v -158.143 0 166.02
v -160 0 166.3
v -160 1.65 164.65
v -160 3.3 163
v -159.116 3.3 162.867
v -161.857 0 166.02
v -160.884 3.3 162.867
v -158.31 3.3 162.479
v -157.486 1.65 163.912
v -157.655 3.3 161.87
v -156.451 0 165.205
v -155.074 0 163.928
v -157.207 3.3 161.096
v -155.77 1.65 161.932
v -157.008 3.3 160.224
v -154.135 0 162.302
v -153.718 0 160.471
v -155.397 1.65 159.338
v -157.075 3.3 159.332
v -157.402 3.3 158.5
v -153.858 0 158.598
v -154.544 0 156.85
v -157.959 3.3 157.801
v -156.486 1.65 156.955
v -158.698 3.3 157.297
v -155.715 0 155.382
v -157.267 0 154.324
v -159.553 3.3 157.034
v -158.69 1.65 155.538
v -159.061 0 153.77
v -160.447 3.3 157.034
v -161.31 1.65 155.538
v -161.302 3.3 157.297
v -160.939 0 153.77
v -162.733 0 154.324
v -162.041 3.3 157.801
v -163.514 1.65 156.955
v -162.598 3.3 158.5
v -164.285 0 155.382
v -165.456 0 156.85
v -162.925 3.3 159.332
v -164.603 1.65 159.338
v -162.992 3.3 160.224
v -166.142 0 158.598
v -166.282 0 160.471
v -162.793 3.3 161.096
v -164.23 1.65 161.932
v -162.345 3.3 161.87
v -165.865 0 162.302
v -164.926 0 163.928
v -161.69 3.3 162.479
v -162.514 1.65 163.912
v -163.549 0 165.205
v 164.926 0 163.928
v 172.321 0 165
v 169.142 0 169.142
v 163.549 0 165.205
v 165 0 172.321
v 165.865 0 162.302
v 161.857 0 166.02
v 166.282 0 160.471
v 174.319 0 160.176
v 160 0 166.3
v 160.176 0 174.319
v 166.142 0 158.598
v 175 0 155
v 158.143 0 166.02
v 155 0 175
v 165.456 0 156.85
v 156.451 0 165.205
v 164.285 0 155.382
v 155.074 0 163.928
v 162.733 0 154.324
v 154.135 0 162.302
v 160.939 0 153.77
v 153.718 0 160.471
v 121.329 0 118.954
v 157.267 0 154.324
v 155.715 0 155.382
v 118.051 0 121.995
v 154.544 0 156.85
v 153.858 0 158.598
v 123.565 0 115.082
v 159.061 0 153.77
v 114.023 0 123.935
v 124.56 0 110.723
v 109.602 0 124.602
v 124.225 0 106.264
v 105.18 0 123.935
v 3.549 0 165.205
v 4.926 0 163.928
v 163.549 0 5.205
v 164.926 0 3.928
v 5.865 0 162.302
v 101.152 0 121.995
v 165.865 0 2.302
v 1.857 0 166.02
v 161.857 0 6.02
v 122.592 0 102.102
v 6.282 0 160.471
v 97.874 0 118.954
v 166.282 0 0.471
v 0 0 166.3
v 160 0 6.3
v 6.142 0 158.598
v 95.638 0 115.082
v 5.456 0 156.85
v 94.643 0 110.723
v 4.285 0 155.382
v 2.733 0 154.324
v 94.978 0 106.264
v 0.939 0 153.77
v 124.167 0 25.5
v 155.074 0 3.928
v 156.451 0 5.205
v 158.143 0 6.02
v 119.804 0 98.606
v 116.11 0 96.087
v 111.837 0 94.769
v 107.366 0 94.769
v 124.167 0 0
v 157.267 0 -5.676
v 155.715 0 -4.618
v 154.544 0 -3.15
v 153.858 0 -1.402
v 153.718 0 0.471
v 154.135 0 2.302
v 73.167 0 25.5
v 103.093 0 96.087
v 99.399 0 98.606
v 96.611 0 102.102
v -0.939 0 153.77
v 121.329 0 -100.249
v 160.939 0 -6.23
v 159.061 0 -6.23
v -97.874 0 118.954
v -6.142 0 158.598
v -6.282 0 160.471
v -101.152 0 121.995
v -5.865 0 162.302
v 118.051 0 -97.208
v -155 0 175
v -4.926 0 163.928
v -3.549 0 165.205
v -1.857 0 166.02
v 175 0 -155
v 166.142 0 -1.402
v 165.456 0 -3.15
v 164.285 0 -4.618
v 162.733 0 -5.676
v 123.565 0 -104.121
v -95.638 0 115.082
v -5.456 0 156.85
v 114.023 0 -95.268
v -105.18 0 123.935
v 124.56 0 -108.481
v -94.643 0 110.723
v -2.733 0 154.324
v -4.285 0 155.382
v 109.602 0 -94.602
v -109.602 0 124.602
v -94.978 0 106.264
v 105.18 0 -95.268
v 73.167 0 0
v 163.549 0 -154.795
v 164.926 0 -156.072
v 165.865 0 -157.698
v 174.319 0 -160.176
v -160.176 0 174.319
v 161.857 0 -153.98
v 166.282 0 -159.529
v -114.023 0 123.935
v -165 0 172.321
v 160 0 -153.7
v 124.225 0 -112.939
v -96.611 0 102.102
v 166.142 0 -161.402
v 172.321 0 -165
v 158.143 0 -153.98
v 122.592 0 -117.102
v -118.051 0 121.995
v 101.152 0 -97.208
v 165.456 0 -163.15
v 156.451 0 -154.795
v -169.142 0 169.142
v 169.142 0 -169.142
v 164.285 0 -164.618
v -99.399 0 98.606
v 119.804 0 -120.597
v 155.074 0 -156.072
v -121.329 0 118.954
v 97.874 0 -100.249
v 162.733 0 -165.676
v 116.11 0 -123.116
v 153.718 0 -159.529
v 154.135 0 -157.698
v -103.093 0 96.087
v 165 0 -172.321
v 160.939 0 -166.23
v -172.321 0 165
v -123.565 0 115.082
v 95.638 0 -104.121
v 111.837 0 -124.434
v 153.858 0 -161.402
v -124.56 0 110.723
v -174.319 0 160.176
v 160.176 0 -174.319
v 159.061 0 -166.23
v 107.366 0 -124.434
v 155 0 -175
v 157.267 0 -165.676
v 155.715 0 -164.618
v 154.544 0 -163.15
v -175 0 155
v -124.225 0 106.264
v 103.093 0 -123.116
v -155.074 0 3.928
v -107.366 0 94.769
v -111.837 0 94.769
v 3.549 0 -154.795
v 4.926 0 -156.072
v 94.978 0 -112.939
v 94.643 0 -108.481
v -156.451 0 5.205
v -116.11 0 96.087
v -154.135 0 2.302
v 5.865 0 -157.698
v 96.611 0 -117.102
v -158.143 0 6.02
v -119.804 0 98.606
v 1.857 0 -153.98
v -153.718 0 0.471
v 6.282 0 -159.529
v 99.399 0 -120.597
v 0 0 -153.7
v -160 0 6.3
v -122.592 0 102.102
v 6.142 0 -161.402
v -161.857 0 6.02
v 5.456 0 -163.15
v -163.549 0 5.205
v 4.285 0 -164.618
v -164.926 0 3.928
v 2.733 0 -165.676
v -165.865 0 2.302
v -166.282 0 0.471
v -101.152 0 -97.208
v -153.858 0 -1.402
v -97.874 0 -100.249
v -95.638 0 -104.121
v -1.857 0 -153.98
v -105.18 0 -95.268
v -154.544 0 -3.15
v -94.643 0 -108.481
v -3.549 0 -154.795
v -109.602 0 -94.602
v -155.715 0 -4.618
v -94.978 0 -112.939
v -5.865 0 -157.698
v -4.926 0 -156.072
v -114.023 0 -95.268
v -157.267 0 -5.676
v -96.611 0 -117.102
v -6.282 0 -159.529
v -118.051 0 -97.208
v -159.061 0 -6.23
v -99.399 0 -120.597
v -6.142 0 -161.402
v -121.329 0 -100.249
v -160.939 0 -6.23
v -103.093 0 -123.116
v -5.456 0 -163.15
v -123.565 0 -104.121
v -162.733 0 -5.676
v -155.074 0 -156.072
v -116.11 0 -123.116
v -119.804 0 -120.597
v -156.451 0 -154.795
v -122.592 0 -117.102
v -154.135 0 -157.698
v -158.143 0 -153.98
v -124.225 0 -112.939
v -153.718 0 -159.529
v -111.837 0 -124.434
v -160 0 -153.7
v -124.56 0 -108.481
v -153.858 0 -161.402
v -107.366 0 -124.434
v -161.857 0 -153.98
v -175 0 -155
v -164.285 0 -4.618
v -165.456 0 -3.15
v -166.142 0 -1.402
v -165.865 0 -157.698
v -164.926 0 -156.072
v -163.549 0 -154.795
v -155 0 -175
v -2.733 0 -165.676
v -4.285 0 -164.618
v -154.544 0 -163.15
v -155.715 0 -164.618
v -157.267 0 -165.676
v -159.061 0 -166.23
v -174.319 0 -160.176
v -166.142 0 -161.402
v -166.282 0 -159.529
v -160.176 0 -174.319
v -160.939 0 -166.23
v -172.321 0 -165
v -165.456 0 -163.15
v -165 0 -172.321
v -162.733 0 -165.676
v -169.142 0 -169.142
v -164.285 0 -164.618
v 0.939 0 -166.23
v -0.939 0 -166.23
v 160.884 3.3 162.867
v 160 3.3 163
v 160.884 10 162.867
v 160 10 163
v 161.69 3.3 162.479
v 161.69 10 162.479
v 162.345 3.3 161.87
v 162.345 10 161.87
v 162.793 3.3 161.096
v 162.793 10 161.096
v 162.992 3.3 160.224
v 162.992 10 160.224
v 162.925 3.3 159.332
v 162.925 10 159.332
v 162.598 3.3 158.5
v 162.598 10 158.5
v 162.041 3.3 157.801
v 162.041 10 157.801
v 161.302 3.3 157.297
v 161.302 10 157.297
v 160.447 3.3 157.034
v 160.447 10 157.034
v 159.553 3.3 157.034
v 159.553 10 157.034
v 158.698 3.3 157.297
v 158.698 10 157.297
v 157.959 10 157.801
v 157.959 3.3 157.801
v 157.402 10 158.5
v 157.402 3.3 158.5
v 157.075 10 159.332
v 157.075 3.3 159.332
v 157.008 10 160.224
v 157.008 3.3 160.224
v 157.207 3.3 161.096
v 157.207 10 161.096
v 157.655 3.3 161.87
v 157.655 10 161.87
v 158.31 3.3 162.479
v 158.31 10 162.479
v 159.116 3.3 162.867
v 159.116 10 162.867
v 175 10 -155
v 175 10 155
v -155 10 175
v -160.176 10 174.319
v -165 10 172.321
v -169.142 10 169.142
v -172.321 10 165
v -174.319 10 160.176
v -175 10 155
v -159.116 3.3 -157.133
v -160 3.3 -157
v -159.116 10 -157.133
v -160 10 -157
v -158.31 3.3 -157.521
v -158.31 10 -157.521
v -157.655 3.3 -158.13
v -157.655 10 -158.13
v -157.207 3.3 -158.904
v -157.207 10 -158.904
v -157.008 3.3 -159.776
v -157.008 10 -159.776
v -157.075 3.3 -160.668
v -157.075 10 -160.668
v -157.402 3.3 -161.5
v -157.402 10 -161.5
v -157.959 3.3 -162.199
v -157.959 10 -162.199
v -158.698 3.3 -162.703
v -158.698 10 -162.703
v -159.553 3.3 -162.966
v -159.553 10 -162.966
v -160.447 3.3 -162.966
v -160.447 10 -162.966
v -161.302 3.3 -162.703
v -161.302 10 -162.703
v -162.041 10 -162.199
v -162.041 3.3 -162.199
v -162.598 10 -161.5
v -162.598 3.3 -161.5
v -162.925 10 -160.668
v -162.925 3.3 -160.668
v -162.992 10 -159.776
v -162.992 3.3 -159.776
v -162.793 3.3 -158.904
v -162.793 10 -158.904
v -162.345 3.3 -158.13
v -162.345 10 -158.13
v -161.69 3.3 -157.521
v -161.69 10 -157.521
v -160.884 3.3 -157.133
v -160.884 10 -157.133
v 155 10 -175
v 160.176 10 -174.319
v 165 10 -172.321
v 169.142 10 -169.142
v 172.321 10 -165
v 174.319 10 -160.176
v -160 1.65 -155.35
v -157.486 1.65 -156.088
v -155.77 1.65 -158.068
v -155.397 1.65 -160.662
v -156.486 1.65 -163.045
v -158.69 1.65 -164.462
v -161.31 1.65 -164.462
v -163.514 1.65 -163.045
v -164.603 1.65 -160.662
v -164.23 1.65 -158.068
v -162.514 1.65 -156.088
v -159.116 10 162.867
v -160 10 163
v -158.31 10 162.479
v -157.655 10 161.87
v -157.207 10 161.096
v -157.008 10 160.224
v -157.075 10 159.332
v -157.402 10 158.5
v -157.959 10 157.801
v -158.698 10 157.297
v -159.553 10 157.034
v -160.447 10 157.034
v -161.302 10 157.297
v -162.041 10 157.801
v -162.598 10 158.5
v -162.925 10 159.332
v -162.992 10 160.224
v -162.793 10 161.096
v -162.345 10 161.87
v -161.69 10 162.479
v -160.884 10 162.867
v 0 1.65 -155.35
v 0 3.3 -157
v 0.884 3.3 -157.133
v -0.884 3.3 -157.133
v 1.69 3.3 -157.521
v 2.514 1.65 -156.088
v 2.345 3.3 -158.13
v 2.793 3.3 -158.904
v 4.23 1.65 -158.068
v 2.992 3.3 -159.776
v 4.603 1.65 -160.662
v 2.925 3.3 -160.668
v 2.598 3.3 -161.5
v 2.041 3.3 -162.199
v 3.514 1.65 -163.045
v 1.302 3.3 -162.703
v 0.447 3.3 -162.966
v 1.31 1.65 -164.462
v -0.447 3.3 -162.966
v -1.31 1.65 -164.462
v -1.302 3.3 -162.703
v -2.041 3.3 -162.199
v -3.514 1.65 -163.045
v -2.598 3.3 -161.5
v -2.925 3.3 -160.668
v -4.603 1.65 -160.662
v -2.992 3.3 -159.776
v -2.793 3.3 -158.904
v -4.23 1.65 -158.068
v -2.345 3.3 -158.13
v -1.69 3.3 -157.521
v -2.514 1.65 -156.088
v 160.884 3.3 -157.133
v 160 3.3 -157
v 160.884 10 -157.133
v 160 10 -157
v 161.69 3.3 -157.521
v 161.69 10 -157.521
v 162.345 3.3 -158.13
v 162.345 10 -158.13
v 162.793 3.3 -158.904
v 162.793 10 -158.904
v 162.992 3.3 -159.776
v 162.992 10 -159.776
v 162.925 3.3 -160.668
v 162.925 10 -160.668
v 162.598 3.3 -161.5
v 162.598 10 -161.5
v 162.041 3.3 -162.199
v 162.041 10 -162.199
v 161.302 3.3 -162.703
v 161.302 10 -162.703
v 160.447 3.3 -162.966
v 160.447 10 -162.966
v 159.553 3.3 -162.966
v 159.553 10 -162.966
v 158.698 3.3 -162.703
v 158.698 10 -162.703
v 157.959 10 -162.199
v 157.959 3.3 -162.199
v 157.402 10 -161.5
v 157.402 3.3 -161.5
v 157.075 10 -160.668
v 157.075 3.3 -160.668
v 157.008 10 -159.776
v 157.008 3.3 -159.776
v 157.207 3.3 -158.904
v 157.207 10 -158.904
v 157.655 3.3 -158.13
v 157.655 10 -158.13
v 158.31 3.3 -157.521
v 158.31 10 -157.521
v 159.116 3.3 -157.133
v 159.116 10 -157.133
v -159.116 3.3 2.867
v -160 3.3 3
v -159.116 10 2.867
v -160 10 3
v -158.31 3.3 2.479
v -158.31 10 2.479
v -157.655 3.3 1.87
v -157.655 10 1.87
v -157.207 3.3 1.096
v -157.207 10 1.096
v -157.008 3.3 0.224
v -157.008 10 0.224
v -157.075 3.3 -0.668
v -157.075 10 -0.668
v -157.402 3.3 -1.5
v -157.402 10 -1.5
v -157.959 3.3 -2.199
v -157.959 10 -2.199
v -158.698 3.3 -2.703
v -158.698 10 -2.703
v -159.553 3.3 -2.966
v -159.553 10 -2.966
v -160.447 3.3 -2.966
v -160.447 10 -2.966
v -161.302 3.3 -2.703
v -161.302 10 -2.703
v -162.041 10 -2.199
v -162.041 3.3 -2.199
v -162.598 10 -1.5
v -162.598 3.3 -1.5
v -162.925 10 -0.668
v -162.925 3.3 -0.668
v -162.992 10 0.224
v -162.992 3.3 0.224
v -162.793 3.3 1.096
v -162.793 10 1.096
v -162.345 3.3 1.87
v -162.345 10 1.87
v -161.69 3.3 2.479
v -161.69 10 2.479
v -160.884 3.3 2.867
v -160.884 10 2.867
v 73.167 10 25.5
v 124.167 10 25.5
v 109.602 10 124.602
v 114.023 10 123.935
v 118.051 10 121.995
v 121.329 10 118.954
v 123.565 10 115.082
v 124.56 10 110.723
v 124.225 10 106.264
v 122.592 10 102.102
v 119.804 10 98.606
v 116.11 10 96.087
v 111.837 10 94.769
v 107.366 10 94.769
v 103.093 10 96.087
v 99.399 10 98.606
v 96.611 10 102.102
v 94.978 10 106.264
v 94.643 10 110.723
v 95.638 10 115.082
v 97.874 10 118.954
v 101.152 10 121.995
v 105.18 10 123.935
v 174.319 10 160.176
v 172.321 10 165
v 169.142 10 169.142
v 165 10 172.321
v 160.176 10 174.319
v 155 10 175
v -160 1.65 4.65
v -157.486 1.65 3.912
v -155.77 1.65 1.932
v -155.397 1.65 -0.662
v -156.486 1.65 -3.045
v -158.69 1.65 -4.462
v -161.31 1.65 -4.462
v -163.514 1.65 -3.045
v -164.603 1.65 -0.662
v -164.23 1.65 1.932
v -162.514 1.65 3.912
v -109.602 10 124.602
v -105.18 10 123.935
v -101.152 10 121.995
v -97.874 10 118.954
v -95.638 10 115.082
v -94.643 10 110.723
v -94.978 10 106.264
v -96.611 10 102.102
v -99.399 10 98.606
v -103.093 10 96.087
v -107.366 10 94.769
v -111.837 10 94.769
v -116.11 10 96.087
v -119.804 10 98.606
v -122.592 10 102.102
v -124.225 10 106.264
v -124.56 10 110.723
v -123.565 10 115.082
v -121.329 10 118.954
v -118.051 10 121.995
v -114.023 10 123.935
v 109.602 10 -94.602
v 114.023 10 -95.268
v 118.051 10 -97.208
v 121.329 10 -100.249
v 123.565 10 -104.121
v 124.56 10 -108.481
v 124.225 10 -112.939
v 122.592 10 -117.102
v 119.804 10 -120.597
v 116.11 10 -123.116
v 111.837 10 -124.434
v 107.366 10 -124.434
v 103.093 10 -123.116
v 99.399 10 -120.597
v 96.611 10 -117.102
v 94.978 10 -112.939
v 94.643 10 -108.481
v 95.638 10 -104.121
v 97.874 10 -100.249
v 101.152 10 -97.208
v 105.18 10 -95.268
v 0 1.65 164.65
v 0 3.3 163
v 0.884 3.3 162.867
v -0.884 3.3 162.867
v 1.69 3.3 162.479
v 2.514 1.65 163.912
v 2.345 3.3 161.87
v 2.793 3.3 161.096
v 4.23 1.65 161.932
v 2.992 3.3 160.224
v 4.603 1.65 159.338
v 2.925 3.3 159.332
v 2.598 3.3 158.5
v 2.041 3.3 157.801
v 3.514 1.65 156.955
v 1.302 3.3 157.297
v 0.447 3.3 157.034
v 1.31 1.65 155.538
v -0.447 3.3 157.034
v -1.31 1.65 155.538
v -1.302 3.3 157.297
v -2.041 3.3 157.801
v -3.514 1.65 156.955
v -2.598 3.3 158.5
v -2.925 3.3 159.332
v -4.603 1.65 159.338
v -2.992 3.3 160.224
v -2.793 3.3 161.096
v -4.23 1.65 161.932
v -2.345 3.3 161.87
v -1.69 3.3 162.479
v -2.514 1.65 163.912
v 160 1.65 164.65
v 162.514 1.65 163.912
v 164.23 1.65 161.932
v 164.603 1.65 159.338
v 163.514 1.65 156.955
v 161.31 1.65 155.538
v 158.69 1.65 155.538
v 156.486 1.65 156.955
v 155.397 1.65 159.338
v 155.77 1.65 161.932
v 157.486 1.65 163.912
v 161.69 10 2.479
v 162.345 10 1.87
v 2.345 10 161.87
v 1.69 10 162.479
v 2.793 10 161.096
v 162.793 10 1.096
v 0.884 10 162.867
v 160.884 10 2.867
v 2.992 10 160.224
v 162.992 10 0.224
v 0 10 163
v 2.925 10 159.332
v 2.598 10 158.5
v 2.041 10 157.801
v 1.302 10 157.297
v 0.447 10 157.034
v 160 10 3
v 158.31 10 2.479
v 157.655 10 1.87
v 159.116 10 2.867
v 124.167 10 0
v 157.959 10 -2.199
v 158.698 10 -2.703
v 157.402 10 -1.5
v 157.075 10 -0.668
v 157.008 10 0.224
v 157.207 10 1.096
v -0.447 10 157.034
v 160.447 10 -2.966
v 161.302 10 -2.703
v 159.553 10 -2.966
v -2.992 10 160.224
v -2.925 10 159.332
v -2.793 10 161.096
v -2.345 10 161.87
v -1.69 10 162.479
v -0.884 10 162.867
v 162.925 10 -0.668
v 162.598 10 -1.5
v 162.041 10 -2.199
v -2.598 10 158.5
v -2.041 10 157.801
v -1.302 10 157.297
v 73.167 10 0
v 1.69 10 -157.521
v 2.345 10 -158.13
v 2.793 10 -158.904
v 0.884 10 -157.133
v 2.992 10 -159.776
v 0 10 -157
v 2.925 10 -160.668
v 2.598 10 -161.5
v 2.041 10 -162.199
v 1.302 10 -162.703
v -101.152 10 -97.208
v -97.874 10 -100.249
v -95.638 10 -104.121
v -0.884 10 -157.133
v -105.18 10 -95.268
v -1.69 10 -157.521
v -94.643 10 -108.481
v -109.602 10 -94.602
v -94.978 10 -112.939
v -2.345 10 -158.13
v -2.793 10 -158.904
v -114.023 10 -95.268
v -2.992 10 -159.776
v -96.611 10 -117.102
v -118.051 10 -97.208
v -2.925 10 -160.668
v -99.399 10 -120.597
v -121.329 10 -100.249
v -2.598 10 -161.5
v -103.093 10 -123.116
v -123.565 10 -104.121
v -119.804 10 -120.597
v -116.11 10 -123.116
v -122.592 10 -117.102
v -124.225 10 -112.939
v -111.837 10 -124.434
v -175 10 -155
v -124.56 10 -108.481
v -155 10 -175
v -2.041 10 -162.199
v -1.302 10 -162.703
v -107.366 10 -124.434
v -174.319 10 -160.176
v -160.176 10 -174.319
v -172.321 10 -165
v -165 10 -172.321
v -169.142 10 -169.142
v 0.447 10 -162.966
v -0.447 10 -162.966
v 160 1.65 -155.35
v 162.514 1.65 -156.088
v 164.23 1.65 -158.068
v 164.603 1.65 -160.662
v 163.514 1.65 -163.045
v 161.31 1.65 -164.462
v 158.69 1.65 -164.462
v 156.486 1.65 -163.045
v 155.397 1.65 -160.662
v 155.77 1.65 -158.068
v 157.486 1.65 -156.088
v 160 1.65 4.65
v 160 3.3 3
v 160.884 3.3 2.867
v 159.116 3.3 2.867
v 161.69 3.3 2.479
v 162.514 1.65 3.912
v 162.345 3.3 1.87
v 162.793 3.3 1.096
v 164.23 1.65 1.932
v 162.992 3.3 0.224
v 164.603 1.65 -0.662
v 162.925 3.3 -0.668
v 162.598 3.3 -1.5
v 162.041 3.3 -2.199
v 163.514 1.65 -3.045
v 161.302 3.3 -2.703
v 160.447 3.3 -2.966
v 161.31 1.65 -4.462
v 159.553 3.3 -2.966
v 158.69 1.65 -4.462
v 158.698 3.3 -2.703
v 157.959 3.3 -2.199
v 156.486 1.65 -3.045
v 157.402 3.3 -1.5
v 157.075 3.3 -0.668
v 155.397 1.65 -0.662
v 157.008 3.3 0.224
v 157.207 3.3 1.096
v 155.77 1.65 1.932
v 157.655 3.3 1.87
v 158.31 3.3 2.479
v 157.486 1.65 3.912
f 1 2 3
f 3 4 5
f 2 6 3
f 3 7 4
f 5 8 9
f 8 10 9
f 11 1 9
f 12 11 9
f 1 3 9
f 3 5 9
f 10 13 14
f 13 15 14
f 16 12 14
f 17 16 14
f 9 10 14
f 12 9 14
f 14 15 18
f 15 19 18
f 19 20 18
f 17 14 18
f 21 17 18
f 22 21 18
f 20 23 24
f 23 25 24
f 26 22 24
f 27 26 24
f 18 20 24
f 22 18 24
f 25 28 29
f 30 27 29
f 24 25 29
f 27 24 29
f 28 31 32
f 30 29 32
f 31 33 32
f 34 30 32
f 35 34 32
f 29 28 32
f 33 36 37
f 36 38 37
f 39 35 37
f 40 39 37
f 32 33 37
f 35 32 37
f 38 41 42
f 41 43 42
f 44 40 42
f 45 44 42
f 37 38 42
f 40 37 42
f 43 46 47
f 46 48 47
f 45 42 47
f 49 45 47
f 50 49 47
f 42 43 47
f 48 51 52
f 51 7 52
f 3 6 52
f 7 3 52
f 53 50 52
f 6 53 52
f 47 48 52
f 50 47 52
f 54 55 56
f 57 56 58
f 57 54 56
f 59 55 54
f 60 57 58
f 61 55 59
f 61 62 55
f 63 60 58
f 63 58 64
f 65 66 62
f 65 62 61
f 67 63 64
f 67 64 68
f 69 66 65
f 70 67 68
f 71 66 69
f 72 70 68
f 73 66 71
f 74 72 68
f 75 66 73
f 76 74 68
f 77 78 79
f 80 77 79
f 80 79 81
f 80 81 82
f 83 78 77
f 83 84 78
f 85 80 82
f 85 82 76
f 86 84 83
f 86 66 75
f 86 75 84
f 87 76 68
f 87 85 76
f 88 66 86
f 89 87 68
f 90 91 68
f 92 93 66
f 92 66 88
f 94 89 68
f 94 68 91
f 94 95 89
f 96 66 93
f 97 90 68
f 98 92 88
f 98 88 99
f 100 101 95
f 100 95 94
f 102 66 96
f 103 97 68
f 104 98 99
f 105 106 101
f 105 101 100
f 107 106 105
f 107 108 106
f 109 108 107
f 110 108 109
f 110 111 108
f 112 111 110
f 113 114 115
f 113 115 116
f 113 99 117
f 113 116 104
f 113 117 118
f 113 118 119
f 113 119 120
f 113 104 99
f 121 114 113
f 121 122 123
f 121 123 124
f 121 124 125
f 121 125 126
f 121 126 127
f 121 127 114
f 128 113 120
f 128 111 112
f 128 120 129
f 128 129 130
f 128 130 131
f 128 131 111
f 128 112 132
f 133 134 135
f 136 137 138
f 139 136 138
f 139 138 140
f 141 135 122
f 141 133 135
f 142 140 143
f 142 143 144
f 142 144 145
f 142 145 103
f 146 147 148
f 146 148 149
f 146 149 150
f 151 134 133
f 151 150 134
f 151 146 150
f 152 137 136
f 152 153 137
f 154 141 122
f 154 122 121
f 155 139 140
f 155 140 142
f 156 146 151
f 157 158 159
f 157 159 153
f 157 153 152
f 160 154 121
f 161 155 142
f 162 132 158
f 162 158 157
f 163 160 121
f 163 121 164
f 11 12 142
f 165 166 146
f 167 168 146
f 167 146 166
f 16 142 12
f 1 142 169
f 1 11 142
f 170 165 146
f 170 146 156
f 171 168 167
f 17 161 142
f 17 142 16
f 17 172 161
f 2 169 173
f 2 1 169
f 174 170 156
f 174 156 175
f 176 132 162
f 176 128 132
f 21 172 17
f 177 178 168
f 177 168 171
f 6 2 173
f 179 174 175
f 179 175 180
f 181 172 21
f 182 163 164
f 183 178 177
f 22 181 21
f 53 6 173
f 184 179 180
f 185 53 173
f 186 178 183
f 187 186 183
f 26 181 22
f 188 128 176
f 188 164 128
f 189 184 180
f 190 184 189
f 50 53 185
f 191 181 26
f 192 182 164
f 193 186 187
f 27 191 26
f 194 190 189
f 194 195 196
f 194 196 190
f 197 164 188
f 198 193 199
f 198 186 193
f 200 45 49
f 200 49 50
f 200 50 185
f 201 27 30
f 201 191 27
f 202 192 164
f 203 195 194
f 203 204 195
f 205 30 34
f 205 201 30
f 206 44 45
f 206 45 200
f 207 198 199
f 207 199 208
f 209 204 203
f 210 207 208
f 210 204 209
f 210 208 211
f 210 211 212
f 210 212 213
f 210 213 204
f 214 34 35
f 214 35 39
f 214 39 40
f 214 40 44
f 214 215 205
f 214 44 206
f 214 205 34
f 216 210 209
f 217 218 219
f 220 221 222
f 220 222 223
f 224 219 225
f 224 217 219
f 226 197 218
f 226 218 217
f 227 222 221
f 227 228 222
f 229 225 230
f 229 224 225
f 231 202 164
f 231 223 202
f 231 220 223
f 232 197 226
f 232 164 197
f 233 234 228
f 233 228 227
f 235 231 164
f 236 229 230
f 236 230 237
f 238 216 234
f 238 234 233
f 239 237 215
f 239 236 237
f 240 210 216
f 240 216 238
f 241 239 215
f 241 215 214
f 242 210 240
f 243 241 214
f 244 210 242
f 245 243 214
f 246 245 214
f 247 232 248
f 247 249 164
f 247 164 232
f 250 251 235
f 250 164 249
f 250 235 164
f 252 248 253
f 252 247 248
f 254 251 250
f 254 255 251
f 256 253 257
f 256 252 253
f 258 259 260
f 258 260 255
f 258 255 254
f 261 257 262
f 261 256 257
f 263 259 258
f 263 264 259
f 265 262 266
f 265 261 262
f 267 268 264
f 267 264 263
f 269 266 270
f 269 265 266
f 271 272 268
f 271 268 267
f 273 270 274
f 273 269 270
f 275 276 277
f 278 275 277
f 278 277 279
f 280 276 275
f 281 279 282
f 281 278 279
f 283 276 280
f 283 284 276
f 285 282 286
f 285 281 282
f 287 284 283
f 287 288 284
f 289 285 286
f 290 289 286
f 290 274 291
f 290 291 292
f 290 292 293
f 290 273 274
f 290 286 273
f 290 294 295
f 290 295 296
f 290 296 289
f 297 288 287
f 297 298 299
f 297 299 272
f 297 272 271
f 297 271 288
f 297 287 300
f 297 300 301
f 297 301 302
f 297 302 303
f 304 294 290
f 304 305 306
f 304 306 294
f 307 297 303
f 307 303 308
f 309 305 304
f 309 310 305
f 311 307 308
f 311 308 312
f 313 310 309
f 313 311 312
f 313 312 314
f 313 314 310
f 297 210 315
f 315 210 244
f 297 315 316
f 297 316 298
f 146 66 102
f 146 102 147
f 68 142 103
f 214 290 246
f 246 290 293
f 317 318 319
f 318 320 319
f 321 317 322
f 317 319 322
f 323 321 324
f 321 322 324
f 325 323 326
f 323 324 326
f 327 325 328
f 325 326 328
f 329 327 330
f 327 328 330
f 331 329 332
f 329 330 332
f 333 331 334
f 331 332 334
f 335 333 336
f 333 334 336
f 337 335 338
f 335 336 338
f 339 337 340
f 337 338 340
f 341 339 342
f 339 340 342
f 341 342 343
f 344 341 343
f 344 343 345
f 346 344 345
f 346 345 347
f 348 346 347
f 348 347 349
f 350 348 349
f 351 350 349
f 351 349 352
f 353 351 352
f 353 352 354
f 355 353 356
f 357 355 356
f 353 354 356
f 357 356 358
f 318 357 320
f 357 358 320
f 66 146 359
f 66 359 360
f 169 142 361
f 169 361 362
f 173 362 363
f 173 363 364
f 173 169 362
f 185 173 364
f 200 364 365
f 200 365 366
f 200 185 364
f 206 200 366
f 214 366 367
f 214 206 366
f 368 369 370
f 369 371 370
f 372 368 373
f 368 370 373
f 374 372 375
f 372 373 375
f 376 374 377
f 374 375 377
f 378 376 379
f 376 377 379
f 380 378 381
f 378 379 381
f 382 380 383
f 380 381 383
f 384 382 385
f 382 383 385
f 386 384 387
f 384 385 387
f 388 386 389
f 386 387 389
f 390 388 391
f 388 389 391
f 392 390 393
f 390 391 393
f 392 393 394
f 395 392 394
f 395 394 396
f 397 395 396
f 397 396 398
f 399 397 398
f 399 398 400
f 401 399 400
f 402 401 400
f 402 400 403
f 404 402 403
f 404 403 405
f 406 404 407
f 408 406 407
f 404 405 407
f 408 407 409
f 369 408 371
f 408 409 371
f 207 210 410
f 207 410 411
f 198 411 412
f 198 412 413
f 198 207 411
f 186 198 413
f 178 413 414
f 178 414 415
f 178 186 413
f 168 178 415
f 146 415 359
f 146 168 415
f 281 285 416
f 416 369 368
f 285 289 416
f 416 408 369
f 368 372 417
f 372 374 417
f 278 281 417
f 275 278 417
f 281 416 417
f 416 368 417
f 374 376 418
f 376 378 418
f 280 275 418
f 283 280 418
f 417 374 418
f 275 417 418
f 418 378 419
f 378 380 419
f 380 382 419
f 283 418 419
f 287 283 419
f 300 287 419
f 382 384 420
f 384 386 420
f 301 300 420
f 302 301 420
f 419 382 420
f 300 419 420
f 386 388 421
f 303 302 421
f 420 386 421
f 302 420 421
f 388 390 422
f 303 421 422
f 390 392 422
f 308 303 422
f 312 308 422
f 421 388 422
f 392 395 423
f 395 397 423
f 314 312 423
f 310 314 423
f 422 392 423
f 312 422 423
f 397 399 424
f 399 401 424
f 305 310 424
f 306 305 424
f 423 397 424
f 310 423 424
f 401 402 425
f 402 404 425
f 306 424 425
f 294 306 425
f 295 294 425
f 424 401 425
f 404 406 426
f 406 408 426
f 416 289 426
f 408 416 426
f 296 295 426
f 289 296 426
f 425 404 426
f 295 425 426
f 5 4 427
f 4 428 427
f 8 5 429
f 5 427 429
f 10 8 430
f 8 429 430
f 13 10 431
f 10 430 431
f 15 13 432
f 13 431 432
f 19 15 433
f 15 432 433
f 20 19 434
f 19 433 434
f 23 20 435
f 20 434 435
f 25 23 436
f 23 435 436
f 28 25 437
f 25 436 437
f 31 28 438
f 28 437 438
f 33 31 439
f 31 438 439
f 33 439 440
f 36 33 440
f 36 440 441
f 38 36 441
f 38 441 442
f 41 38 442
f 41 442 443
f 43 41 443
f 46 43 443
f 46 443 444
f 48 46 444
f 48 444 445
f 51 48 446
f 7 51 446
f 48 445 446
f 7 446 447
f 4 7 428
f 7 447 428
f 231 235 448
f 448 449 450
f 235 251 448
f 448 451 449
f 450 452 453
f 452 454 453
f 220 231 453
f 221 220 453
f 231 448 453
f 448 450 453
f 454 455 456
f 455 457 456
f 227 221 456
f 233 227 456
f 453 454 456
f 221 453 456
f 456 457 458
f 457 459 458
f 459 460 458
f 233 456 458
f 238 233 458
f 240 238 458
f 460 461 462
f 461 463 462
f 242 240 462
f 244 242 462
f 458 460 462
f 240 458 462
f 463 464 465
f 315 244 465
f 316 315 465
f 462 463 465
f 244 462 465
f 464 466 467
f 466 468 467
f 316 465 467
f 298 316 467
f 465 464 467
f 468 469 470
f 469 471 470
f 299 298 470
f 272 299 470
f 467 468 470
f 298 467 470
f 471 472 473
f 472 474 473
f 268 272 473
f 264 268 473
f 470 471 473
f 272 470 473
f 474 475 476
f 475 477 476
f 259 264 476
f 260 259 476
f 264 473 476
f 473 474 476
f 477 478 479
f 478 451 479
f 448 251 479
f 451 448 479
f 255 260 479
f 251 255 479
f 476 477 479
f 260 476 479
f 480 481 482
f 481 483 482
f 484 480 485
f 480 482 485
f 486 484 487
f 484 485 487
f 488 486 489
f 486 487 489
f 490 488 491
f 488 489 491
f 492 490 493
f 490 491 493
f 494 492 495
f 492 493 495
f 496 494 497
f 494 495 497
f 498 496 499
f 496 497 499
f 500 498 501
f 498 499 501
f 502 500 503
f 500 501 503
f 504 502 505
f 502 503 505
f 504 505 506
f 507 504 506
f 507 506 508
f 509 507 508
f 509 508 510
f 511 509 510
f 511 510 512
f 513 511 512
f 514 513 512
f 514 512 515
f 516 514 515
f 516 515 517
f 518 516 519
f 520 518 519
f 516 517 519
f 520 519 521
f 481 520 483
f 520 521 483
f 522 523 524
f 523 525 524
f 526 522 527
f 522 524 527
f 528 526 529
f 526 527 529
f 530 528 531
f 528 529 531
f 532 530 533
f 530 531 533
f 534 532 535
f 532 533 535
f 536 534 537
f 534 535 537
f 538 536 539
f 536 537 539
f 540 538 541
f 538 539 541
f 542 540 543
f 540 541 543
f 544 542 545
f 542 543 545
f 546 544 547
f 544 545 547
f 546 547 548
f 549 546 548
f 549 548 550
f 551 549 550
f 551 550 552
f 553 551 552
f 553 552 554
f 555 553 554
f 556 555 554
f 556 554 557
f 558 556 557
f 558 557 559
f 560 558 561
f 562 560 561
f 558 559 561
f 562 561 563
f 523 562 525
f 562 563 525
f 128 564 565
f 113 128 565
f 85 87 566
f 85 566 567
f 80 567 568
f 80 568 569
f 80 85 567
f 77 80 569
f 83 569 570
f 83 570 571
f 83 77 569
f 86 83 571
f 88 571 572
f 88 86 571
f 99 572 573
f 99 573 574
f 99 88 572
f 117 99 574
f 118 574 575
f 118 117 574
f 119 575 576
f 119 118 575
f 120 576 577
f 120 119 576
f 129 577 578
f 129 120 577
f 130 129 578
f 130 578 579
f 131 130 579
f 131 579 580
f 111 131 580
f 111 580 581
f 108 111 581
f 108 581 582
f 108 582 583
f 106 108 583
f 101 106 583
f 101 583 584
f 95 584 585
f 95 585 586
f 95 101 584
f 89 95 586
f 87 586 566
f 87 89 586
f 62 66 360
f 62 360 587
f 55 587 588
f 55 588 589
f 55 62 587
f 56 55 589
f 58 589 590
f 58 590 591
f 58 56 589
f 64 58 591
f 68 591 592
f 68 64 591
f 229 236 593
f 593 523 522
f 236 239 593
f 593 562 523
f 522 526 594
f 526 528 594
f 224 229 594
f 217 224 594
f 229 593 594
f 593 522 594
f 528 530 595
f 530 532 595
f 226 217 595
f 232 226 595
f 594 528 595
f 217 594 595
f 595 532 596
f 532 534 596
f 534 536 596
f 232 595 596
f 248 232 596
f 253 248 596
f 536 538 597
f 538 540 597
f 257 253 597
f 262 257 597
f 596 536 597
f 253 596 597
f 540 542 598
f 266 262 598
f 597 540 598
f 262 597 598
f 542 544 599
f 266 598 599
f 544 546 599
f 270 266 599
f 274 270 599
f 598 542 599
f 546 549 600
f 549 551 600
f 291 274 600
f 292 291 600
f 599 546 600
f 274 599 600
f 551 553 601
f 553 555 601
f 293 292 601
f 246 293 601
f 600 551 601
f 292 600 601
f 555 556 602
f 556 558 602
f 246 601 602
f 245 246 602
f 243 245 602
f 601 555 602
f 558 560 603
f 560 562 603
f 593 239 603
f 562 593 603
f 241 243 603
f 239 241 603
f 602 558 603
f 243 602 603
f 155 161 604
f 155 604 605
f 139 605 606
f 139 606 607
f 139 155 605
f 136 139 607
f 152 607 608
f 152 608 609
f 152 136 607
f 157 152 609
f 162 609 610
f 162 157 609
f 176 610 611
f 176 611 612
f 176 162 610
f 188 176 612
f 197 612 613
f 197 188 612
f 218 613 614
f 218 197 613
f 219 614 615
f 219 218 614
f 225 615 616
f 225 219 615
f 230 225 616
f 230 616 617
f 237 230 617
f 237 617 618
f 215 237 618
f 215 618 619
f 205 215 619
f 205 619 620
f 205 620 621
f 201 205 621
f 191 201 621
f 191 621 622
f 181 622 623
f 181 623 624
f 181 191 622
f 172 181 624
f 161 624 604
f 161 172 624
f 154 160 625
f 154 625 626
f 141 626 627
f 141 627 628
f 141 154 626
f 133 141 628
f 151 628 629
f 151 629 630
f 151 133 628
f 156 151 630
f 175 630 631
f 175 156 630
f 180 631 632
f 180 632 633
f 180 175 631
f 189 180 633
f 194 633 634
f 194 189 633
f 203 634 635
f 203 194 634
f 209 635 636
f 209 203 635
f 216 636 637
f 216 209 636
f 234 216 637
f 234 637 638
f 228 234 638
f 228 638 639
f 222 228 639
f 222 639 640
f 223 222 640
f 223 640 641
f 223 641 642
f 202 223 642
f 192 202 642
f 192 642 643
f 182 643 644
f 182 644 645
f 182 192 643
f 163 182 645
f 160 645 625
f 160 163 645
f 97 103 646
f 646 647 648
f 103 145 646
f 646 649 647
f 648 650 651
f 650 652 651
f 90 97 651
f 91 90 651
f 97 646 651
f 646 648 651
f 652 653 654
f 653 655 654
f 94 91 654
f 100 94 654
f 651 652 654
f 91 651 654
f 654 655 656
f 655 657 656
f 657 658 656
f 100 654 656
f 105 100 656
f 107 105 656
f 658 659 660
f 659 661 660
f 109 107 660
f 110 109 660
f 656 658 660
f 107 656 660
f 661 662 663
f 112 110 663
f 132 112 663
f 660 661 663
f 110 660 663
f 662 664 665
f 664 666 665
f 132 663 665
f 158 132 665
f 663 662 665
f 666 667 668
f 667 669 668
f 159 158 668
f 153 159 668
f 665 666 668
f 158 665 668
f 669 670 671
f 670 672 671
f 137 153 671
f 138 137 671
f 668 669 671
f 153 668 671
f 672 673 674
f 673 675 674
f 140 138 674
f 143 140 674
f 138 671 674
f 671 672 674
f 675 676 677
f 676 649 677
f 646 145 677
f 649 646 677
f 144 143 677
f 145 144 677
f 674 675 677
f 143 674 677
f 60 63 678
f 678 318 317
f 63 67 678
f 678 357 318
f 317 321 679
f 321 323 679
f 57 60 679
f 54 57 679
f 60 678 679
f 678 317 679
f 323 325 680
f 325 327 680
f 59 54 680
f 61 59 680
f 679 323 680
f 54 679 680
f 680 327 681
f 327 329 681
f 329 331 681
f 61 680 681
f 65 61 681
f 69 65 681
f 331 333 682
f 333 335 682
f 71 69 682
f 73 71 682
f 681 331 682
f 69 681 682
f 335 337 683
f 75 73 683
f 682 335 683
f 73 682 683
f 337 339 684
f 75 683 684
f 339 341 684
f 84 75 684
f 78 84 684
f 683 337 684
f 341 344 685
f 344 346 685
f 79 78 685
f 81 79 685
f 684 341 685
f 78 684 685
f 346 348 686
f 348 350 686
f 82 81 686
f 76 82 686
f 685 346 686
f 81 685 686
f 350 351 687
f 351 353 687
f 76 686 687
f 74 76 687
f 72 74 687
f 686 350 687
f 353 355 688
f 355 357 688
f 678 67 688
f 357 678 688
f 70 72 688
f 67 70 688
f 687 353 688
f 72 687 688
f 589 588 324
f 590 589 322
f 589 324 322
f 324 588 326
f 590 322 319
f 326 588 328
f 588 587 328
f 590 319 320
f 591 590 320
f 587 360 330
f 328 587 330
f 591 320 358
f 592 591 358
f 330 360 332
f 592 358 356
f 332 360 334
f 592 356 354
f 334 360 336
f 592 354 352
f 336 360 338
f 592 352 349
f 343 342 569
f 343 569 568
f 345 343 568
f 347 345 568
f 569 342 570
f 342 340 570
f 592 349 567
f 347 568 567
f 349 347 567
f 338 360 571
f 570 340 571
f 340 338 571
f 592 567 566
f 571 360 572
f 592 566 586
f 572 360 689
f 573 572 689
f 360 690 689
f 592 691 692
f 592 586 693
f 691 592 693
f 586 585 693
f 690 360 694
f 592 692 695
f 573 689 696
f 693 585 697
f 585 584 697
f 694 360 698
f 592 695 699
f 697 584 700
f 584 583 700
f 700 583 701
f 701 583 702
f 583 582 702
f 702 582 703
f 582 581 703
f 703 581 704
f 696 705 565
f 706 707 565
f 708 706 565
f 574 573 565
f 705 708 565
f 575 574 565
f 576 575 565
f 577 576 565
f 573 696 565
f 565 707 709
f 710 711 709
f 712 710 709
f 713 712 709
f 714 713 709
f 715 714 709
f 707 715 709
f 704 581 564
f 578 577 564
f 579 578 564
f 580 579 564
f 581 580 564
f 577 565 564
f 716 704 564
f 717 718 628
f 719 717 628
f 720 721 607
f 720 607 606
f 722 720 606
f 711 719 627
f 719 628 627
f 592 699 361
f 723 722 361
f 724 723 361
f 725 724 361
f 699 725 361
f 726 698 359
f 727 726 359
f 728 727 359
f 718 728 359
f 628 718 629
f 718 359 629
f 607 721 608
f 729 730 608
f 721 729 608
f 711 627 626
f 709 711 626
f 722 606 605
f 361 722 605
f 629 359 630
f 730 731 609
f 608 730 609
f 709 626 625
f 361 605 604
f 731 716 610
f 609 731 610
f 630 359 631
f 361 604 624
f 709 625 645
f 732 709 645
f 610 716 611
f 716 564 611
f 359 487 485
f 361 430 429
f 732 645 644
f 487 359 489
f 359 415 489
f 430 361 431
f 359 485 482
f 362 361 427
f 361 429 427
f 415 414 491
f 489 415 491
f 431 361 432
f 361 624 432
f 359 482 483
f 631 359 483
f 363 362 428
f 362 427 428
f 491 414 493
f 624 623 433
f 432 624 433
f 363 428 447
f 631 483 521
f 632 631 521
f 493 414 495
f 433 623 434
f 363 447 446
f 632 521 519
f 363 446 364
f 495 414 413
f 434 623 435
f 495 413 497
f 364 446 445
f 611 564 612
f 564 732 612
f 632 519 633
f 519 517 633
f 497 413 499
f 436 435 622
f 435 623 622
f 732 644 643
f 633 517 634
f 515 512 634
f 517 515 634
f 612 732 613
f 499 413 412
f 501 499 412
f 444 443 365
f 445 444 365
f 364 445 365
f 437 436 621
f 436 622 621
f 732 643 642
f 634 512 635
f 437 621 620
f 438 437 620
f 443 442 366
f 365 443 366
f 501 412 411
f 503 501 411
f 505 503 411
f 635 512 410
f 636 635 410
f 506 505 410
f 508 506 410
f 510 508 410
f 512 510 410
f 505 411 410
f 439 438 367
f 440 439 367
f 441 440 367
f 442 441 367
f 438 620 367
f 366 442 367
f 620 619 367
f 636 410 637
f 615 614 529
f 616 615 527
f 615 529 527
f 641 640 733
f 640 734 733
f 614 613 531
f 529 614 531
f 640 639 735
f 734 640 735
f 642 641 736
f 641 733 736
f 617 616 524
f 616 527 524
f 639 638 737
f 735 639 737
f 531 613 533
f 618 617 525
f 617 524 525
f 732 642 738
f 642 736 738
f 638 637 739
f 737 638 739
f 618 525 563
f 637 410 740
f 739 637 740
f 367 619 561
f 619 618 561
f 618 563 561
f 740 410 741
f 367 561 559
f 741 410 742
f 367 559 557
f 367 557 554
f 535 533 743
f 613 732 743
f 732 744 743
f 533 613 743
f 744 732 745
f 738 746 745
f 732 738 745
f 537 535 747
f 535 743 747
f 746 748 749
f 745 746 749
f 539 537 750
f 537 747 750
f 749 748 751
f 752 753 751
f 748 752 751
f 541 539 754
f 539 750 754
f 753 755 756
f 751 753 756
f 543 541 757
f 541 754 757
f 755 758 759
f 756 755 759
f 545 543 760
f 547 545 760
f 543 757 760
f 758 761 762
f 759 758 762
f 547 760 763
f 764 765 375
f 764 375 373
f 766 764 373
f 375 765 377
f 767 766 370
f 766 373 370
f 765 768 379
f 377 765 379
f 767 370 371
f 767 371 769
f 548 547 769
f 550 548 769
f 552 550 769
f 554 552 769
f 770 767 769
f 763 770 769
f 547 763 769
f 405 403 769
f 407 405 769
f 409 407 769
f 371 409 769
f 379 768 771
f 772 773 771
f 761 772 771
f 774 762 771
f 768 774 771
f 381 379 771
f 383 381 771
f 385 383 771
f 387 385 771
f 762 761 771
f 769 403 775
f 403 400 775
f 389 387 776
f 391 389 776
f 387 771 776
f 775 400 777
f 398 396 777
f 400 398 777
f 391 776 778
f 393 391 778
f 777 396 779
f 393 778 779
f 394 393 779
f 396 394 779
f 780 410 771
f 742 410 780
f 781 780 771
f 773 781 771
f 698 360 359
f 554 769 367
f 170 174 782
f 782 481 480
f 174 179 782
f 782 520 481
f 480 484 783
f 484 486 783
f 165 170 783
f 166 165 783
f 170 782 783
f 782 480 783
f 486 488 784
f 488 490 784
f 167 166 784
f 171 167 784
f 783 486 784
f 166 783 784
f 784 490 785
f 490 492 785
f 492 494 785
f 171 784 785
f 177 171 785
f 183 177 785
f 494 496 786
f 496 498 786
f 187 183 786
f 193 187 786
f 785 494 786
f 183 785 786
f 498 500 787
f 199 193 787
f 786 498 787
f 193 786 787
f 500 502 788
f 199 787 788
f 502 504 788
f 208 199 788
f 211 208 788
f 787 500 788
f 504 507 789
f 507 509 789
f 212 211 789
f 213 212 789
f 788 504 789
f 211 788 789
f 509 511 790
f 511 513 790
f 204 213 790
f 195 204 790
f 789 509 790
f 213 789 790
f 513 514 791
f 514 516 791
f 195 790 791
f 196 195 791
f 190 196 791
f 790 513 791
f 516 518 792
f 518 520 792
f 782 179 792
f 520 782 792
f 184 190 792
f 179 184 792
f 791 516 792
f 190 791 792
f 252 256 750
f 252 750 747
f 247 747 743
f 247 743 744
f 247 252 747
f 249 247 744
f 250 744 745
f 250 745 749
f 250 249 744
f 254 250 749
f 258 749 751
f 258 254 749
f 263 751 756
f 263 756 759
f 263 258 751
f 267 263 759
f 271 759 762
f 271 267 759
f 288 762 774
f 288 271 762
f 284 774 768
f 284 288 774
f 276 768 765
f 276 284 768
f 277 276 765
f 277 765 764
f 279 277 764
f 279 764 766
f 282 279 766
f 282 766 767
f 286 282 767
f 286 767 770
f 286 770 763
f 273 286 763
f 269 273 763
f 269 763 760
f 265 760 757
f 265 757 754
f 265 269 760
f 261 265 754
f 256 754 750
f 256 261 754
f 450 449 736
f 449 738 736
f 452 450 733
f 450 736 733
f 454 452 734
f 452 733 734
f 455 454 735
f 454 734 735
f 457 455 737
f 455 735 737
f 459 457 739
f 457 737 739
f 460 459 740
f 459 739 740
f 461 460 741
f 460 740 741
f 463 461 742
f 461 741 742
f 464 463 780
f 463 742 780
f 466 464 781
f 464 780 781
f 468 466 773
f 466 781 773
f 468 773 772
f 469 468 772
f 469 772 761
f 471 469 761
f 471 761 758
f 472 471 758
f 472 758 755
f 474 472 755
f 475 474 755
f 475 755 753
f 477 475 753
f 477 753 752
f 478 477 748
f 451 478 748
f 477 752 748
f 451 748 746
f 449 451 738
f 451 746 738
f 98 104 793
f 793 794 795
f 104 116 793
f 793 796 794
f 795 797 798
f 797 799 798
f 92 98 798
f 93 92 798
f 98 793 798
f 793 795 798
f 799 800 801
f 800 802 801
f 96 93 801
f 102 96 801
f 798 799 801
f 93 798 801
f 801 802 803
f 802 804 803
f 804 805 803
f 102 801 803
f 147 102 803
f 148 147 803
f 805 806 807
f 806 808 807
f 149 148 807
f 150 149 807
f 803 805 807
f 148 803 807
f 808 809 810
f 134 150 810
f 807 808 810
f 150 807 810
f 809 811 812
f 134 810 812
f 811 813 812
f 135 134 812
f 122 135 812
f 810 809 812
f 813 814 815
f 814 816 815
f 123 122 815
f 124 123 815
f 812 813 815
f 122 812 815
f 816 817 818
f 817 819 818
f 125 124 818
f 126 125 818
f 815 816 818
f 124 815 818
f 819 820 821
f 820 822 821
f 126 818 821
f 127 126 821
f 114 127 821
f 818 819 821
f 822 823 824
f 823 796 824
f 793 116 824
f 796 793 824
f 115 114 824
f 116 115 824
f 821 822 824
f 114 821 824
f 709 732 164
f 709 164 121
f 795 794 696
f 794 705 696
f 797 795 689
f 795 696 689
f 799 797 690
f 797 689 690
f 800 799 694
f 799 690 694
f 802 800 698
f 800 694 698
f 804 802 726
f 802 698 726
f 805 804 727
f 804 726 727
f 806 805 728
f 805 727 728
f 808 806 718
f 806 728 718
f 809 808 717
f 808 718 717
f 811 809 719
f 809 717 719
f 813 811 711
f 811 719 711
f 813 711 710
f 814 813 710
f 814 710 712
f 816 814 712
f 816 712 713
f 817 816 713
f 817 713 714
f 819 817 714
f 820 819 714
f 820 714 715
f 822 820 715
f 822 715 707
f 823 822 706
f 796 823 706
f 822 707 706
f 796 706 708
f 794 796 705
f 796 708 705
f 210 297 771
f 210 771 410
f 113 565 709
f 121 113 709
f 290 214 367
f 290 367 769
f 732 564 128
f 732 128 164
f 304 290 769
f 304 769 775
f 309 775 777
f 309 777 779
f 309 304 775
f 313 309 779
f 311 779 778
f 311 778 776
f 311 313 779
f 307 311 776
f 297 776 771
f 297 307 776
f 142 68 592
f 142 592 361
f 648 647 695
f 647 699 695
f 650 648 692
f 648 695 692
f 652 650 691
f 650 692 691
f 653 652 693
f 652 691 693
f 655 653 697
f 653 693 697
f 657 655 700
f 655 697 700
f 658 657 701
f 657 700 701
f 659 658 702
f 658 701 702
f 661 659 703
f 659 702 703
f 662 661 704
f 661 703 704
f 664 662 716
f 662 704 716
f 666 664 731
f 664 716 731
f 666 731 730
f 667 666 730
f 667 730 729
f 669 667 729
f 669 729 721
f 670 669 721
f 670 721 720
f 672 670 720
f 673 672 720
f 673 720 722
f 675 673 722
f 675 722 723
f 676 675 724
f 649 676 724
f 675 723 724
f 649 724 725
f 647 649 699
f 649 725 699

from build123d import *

# Parameters (mm, degrees)
SKETCH1_R                                       = 15
BOSS_EXTRUDE1_DEPTH                             = 10
CSK_FOR_M6_FLAT_HEAD_MACHINE_SCREW2_D           = 6
CSK_FOR_M6_FLAT_HEAD_MACHINE_SCREW2_CSINK_D     = 12.6
CSK_FOR_M6_FLAT_HEAD_MACHINE_SCREW2_CSINK_ANGLE = 90
SKETCH6_W                                       = 51
SKETCH6_H                                       = 25.5
CUT_EXTRUDE1_DEPTH                              = 10


with BuildPart() as part:
    # Sketch1 → Boss-Extrude1 (new body)
    with BuildSketch(Plane(origin=(0, 0, 0), x_dir=(1, 0, 0), z_dir=(0, 1, 0))):
        with BuildLine():
            Line((-155, 175), (155, 175))
            ThreePointArc((155, 175), (169.142135624, 169.142135624), (175, 155))
            Line((175, 155), (175, -155))
            ThreePointArc((175, -155), (169.142135624, -169.142135624), (155, -175))
            Line((155, -175), (-155, -175))
            ThreePointArc((-155, -175), (-169.142135624, -169.142135624), (-175, -155))
            Line((-175, -155), (-175, 155))
            ThreePointArc((-175, 155), (-169.142135624, 169.142135624), (-155, 175))
        make_face()
        with Locations(Location((-109.601551084, 109.601551084, 0), (0, 0, 270))):
            Circle(SKETCH1_R, mode=Mode.SUBTRACT)
        with Locations(Location((109.601551084, 109.601551084, 0), (0, 0, 270))):
            Circle(SKETCH1_R, mode=Mode.SUBTRACT)
        with Locations(Location((-109.601551084, -109.601551084, 0), (0, 0, 270))):
            Circle(SKETCH1_R, mode=Mode.SUBTRACT)
        with Locations(Location((109.601551084, -109.601551084, 0), (0, 0, 270))):
            Circle(SKETCH1_R, mode=Mode.SUBTRACT)
    extrude(amount=BOSS_EXTRUDE1_DEPTH)

    # CSK for M6 Flat Head Machine Screw2 (through all)
    with Locations(Plane(origin=(160, 0, -160), x_dir=(0, 0, -1), z_dir=(0, -1, 0))):
        with Locations((0, 0), (-160, 0), (-320, 0), (-320, -160), (-320, -320), (-160, -320), (0, -320), (0, -160)):
            CounterSinkHole(CSK_FOR_M6_FLAT_HEAD_MACHINE_SCREW2_D / 2, CSK_FOR_M6_FLAT_HEAD_MACHINE_SCREW2_CSINK_D / 2, counter_sink_angle=CSK_FOR_M6_FLAT_HEAD_MACHINE_SCREW2_CSINK_ANGLE)

    # Sketch6 → Cut-Extrude1 (cut)
    with BuildSketch(Plane(origin=(0, 10, 0), x_dir=(1, 0, 0), z_dir=(0, 1, 0))):
        with Locations((98.666512481, -12.75)):
            Rectangle(SKETCH6_W, SKETCH6_H)
    extrude(amount=-CUT_EXTRUDE1_DEPTH, mode=Mode.SUBTRACT)


solid = part.part
